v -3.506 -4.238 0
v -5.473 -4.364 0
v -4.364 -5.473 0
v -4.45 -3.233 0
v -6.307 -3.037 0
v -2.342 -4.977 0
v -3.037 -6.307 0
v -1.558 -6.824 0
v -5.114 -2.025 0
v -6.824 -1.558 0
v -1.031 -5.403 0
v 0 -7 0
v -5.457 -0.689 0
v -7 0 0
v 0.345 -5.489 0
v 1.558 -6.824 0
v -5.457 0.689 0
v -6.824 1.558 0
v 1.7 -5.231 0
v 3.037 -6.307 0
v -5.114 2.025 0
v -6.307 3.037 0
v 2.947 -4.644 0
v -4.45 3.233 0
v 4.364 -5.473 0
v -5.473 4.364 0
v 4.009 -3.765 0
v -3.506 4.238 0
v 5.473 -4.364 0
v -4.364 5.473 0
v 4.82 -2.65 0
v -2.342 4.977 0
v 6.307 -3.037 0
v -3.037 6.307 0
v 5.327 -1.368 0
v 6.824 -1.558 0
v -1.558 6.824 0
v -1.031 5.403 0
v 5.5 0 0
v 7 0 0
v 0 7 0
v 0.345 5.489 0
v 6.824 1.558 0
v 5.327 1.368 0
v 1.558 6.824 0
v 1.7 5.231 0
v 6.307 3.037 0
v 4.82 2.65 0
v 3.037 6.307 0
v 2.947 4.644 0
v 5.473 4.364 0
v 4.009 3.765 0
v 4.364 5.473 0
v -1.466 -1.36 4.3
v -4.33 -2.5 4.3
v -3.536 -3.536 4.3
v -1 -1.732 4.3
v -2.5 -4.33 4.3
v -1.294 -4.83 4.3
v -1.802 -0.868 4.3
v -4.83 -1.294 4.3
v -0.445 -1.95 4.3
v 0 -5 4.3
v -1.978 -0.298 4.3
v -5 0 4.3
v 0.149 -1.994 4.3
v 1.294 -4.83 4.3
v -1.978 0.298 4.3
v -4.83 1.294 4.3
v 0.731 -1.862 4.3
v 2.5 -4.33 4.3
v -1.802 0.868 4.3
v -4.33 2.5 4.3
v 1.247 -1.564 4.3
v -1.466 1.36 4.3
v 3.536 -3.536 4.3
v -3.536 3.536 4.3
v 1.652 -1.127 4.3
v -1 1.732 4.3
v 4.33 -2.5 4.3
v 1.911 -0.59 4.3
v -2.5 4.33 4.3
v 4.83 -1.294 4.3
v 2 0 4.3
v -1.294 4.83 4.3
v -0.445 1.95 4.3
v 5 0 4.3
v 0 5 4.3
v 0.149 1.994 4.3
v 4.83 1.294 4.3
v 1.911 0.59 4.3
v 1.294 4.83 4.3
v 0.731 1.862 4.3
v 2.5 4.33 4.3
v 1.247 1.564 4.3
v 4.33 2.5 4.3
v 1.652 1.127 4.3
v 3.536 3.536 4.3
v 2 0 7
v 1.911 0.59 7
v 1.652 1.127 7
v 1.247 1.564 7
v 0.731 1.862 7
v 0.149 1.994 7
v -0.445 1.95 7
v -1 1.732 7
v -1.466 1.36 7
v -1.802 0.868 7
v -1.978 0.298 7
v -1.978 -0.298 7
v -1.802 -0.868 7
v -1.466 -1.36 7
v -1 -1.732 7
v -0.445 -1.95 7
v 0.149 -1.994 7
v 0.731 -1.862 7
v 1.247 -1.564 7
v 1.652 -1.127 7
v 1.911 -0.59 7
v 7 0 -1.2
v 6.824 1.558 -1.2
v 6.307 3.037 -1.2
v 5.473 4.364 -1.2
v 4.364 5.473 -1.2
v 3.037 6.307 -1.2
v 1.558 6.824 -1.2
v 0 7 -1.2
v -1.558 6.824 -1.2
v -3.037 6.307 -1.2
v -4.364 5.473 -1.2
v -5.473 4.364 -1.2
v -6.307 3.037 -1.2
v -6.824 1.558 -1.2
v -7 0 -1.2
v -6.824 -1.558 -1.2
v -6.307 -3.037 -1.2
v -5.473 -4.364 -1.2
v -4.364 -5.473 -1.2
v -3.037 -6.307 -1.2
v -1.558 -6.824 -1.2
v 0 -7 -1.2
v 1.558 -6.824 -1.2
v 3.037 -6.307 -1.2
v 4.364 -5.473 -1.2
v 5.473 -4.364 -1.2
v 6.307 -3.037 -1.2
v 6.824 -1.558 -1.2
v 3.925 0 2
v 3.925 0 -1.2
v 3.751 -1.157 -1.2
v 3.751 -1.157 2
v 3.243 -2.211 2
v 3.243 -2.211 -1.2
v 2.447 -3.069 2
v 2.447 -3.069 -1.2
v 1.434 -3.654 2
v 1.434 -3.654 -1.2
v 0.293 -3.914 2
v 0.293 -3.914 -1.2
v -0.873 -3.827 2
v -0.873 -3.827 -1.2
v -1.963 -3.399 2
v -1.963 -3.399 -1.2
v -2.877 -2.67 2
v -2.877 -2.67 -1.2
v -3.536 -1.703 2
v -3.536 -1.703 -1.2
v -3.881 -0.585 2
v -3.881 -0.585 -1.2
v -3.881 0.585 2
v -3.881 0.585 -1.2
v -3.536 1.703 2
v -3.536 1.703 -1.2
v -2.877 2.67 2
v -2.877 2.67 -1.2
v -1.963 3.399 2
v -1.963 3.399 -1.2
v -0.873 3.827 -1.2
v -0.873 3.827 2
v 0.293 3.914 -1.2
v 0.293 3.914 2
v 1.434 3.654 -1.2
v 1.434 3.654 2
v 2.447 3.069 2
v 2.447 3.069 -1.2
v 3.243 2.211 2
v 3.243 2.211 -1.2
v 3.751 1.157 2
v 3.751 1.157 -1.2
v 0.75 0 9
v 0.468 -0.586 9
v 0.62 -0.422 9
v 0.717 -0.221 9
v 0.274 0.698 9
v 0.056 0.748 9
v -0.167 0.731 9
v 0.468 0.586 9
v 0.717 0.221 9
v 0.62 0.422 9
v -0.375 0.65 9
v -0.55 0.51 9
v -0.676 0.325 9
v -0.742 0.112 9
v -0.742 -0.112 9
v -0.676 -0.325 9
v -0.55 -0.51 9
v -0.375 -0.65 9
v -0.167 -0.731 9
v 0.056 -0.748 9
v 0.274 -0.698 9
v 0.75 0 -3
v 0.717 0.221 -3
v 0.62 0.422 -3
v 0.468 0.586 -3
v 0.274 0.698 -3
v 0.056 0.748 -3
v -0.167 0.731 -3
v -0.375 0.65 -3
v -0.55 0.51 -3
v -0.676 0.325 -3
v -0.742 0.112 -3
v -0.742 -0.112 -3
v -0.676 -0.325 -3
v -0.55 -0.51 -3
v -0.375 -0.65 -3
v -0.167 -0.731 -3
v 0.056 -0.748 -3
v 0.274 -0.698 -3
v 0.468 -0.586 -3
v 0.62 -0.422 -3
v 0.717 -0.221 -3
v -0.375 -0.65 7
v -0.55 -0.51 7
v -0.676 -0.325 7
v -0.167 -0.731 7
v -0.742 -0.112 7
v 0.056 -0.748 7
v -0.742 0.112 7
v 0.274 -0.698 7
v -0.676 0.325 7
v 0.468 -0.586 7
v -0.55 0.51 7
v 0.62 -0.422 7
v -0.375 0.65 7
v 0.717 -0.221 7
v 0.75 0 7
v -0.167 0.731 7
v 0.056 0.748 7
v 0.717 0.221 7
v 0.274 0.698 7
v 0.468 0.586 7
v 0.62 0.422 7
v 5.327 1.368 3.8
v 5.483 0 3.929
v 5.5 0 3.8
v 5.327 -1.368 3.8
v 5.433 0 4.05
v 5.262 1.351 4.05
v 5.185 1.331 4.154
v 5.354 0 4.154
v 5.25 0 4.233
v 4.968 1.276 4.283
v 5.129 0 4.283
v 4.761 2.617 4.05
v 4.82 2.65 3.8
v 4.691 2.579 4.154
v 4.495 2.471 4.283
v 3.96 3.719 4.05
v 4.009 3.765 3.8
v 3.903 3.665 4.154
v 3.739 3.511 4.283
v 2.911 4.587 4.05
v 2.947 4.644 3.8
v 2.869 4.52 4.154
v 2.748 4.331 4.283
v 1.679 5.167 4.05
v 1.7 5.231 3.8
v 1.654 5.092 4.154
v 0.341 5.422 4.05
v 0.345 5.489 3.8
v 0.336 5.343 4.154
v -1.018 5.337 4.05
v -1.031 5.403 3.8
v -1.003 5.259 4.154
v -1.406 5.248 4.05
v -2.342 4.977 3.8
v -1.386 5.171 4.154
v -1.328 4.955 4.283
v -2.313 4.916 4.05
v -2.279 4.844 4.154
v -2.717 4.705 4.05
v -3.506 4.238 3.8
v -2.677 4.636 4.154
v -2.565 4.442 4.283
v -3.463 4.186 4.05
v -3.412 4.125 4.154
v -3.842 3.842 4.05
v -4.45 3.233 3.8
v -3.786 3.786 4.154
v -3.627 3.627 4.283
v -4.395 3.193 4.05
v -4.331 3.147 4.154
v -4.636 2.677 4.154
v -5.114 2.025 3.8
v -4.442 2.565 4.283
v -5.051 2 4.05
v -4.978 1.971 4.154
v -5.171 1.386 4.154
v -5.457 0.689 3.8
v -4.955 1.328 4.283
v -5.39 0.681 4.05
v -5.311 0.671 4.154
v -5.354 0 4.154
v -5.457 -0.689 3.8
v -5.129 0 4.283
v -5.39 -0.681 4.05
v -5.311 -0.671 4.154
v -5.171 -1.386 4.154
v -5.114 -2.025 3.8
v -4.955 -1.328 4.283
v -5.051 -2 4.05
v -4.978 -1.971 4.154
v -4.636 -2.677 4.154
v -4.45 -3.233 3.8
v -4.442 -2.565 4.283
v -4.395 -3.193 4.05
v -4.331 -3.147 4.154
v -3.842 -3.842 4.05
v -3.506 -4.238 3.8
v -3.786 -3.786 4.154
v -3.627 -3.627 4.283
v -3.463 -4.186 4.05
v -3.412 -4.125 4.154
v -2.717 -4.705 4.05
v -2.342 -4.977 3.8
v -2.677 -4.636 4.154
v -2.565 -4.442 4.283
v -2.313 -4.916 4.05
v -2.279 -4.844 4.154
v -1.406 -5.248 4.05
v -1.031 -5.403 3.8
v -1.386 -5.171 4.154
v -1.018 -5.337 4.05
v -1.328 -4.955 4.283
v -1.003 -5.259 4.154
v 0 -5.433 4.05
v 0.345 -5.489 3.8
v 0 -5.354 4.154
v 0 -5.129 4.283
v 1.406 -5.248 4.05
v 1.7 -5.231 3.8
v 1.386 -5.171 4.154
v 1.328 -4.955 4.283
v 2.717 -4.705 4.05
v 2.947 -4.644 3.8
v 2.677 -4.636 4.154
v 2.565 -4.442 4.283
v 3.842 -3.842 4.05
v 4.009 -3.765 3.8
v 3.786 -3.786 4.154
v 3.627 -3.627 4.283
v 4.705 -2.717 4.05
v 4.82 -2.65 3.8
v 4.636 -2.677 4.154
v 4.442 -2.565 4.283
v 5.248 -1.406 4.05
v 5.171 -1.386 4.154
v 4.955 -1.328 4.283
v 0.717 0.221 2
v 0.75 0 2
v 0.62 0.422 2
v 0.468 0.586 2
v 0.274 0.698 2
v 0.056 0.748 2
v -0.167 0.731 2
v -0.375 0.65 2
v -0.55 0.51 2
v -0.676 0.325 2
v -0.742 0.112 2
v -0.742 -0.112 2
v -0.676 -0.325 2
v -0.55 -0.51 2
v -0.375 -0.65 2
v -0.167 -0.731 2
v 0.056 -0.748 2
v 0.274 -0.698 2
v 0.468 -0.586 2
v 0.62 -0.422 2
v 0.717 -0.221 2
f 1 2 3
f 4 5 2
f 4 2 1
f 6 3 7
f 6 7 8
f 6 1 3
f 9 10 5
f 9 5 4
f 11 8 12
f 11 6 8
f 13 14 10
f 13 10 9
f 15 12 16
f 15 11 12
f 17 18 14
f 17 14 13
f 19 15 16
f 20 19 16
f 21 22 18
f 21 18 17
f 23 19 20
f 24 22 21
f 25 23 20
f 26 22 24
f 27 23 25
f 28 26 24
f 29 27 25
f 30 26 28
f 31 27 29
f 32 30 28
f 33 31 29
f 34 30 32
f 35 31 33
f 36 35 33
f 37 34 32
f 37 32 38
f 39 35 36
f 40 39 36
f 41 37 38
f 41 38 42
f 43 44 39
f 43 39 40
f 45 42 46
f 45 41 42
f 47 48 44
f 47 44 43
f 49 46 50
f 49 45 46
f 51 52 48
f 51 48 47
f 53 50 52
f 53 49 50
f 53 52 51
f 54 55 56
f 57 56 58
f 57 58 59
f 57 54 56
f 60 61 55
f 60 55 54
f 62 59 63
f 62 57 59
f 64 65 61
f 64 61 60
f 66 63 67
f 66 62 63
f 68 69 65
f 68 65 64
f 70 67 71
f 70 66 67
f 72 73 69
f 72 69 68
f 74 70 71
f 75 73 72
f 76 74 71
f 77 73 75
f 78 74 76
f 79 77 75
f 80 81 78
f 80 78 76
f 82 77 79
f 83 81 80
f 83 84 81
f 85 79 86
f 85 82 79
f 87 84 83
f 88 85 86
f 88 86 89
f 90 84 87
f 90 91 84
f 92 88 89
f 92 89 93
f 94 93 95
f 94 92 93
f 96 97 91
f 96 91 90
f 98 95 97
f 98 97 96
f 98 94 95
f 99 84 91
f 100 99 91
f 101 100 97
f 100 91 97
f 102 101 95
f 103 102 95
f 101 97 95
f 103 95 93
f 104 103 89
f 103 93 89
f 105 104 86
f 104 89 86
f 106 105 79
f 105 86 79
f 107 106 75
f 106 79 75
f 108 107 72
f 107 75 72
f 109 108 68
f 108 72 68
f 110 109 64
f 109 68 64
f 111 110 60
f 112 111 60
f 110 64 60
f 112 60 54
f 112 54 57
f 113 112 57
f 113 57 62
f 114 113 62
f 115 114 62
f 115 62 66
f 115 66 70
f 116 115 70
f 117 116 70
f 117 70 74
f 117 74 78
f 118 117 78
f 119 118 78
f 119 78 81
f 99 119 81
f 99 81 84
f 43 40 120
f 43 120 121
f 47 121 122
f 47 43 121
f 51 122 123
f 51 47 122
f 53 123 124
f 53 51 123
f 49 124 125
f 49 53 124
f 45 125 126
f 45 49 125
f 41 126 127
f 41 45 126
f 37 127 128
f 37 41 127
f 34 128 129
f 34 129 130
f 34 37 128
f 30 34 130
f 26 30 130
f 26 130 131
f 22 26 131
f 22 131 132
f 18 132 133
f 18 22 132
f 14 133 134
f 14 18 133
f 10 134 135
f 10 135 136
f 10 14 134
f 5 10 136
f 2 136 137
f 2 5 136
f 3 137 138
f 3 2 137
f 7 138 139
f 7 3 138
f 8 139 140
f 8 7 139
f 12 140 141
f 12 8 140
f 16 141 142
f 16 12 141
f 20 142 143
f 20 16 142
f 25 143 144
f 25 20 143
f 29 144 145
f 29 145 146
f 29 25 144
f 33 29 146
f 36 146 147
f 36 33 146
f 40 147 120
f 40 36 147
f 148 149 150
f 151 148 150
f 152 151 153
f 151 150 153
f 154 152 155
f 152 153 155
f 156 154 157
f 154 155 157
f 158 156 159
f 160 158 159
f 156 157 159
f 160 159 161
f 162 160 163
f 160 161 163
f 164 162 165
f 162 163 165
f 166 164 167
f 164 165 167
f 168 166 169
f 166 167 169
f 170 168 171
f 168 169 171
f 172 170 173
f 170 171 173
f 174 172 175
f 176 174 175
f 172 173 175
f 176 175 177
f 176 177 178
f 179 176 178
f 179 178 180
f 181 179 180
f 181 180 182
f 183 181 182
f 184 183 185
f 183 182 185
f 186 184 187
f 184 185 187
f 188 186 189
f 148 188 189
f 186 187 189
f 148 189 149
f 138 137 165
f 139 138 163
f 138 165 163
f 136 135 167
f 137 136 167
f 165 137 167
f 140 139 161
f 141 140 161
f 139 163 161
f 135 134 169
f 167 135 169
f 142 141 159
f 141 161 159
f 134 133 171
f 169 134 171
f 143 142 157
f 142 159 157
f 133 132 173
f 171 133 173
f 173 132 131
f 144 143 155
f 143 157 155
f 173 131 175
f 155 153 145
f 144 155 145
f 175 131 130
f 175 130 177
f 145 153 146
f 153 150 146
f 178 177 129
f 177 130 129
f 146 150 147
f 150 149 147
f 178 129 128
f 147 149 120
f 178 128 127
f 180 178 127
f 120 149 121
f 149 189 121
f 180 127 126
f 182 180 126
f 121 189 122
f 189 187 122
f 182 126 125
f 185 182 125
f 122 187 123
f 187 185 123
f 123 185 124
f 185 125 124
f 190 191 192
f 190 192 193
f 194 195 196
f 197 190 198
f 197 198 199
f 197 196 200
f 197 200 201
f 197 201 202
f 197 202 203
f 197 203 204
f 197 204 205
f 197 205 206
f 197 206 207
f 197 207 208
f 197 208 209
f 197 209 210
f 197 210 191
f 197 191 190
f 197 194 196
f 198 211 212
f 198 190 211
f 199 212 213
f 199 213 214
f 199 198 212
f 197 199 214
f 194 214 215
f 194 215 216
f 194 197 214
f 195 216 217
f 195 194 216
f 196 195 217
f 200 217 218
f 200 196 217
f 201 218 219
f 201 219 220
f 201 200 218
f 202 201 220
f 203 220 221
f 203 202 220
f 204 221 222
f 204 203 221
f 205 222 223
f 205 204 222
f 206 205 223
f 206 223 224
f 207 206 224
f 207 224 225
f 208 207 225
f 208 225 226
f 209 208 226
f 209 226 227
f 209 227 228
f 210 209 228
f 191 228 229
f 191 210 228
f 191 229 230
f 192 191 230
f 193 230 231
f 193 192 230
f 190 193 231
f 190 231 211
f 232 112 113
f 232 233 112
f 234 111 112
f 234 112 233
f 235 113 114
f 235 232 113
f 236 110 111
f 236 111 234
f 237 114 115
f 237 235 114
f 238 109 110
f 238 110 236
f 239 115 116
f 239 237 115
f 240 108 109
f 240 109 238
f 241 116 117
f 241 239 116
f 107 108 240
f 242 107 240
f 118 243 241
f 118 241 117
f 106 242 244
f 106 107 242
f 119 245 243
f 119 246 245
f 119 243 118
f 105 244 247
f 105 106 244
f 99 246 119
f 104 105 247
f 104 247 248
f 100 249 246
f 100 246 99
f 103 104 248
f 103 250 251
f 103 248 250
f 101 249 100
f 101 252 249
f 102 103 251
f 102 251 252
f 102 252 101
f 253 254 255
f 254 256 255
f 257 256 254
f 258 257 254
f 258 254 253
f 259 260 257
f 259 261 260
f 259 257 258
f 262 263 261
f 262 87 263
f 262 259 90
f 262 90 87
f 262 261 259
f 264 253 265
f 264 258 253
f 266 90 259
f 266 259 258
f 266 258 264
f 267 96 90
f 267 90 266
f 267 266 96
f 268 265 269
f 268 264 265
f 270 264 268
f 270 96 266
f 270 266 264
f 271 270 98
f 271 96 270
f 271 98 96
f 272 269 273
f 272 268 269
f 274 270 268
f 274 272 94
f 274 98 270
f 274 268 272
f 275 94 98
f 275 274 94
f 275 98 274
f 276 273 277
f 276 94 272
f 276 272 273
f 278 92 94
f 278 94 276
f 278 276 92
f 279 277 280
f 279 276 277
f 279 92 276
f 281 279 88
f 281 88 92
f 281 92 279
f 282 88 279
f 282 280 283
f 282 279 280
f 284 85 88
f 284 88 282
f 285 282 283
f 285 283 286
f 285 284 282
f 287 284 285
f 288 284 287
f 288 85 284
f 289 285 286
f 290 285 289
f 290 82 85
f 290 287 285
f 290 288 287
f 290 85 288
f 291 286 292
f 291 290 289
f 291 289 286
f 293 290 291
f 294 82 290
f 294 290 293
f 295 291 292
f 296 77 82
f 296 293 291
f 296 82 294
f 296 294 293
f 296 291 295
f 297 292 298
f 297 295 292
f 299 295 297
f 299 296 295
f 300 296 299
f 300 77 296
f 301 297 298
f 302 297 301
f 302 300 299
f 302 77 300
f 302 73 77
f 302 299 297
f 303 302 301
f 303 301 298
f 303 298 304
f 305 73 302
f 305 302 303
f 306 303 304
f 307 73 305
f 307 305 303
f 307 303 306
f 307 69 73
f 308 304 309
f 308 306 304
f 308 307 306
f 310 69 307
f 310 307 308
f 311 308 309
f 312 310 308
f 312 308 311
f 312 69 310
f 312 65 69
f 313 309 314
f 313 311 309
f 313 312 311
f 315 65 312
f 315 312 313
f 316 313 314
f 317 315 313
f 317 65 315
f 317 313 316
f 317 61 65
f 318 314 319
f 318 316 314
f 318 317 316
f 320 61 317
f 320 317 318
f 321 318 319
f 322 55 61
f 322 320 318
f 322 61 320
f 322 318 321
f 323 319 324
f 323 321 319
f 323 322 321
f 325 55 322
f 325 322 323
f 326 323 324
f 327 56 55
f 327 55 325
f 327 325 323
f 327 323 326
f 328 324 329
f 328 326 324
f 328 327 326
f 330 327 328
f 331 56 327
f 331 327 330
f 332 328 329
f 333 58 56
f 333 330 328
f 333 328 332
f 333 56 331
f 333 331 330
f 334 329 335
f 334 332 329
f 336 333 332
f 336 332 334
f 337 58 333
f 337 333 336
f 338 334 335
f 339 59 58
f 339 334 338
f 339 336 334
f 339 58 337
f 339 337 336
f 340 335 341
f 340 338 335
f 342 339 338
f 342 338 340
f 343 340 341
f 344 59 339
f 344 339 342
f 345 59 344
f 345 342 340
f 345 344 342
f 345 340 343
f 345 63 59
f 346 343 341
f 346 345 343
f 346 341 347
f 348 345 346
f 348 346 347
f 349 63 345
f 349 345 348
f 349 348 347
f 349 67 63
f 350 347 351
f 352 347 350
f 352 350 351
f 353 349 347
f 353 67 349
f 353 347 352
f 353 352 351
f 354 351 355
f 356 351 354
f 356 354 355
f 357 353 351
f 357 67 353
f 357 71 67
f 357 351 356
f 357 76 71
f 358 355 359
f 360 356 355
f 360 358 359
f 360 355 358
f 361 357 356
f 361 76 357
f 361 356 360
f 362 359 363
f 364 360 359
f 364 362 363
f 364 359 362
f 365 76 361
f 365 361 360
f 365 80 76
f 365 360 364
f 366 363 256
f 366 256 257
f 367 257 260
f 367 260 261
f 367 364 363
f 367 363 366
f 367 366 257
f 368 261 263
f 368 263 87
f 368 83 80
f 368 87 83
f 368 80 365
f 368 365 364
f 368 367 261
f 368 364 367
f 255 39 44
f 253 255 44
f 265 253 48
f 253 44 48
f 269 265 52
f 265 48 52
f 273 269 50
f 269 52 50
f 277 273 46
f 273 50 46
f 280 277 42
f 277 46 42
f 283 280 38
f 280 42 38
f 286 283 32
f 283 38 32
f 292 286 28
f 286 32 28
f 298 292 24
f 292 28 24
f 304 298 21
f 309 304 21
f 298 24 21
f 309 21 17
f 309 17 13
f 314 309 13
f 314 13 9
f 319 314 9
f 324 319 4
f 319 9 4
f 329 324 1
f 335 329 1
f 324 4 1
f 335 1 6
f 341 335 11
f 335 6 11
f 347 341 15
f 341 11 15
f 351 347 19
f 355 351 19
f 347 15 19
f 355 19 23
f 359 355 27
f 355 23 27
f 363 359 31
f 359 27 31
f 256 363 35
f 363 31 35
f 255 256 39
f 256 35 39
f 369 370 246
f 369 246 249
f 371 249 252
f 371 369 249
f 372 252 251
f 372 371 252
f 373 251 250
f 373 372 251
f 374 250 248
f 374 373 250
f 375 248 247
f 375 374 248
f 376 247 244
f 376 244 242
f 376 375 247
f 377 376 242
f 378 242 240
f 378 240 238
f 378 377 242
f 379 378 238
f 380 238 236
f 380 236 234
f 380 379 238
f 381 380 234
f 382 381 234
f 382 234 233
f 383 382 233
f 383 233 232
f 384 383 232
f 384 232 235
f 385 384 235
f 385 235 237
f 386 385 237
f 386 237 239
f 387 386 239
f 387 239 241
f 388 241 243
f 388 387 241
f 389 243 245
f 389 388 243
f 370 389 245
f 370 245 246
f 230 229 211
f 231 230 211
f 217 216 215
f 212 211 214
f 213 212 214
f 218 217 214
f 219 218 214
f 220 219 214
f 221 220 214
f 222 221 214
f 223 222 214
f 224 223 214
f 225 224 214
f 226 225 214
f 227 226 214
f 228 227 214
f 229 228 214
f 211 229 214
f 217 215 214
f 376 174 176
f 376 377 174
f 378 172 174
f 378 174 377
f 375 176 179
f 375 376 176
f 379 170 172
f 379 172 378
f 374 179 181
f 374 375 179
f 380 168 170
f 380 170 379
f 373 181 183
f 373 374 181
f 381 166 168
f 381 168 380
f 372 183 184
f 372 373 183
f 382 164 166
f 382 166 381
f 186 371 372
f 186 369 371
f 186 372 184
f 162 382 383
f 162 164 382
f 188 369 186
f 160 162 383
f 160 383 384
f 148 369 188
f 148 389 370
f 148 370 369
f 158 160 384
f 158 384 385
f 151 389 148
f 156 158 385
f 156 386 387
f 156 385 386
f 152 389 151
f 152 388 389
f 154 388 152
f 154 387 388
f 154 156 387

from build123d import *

# Parameters (mm, degrees)
F0_R          = 7
F0_R_2        = 5.5
F0_R_3        = 2
F0_R_4        = 0.75
F1_DEPTH      = 1.2
F2_DEPTH      = 7
F3_DEPTH      = 9
F3_DEPTH_BACK = 3
F4_DEPTH      = 4.3
F5_R          = 0.5
F6_R          = 3.925
F7_DEPTH      = 3.2


with BuildPart() as f1:
    # F0 (on Top) → F1 (new body)
    with BuildSketch(Plane.XY):
        Circle(F0_R)
        Circle(F0_R_2, mode=Mode.SUBTRACT)
        Circle(F0_R_2)
        Circle(F0_R_3, mode=Mode.SUBTRACT)
        Circle(F0_R_3)
        Circle(F0_R_4, mode=Mode.SUBTRACT)
    extrude(amount=-F1_DEPTH)

    # F0 (on Top) → F2 (join)
    with BuildSketch(Plane.XY):
        Circle(F0_R_3)
        Circle(F0_R_4, mode=Mode.SUBTRACT)
    extrude(amount=F2_DEPTH)

    # F0 (on Top) → F4 (join)
    with BuildSketch(Plane.XY):
        Circle(F0_R_2)
        Circle(F0_R_3, mode=Mode.SUBTRACT)
    extrude(amount=F4_DEPTH)

    # F5
    f5_edges = [f1.edges().sort_by_distance(p)[0] for p in [
        (-5.5, 0, 4.3),
    ]]
    fillet(f5_edges, radius=F5_R)

    # F6 (on face) → F7 (cut)
    with BuildSketch(Plane(origin=(0, 0, -1.2), x_dir=(1, 0, 0), z_dir=(0, 0, -1))):
        Circle(F6_R)
    extrude(amount=-F7_DEPTH, mode=Mode.SUBTRACT)


with BuildPart() as f3:
    # F0 (on Top) → F3 (new body, two sides)
    with BuildSketch(Plane.XY) as f3_sk:
        Circle(F0_R_4)
    extrude(amount=F3_DEPTH)
    extrude(f3_sk.sketch, amount=-F3_DEPTH_BACK)


solid = Compound([f1.part, f3.part])
